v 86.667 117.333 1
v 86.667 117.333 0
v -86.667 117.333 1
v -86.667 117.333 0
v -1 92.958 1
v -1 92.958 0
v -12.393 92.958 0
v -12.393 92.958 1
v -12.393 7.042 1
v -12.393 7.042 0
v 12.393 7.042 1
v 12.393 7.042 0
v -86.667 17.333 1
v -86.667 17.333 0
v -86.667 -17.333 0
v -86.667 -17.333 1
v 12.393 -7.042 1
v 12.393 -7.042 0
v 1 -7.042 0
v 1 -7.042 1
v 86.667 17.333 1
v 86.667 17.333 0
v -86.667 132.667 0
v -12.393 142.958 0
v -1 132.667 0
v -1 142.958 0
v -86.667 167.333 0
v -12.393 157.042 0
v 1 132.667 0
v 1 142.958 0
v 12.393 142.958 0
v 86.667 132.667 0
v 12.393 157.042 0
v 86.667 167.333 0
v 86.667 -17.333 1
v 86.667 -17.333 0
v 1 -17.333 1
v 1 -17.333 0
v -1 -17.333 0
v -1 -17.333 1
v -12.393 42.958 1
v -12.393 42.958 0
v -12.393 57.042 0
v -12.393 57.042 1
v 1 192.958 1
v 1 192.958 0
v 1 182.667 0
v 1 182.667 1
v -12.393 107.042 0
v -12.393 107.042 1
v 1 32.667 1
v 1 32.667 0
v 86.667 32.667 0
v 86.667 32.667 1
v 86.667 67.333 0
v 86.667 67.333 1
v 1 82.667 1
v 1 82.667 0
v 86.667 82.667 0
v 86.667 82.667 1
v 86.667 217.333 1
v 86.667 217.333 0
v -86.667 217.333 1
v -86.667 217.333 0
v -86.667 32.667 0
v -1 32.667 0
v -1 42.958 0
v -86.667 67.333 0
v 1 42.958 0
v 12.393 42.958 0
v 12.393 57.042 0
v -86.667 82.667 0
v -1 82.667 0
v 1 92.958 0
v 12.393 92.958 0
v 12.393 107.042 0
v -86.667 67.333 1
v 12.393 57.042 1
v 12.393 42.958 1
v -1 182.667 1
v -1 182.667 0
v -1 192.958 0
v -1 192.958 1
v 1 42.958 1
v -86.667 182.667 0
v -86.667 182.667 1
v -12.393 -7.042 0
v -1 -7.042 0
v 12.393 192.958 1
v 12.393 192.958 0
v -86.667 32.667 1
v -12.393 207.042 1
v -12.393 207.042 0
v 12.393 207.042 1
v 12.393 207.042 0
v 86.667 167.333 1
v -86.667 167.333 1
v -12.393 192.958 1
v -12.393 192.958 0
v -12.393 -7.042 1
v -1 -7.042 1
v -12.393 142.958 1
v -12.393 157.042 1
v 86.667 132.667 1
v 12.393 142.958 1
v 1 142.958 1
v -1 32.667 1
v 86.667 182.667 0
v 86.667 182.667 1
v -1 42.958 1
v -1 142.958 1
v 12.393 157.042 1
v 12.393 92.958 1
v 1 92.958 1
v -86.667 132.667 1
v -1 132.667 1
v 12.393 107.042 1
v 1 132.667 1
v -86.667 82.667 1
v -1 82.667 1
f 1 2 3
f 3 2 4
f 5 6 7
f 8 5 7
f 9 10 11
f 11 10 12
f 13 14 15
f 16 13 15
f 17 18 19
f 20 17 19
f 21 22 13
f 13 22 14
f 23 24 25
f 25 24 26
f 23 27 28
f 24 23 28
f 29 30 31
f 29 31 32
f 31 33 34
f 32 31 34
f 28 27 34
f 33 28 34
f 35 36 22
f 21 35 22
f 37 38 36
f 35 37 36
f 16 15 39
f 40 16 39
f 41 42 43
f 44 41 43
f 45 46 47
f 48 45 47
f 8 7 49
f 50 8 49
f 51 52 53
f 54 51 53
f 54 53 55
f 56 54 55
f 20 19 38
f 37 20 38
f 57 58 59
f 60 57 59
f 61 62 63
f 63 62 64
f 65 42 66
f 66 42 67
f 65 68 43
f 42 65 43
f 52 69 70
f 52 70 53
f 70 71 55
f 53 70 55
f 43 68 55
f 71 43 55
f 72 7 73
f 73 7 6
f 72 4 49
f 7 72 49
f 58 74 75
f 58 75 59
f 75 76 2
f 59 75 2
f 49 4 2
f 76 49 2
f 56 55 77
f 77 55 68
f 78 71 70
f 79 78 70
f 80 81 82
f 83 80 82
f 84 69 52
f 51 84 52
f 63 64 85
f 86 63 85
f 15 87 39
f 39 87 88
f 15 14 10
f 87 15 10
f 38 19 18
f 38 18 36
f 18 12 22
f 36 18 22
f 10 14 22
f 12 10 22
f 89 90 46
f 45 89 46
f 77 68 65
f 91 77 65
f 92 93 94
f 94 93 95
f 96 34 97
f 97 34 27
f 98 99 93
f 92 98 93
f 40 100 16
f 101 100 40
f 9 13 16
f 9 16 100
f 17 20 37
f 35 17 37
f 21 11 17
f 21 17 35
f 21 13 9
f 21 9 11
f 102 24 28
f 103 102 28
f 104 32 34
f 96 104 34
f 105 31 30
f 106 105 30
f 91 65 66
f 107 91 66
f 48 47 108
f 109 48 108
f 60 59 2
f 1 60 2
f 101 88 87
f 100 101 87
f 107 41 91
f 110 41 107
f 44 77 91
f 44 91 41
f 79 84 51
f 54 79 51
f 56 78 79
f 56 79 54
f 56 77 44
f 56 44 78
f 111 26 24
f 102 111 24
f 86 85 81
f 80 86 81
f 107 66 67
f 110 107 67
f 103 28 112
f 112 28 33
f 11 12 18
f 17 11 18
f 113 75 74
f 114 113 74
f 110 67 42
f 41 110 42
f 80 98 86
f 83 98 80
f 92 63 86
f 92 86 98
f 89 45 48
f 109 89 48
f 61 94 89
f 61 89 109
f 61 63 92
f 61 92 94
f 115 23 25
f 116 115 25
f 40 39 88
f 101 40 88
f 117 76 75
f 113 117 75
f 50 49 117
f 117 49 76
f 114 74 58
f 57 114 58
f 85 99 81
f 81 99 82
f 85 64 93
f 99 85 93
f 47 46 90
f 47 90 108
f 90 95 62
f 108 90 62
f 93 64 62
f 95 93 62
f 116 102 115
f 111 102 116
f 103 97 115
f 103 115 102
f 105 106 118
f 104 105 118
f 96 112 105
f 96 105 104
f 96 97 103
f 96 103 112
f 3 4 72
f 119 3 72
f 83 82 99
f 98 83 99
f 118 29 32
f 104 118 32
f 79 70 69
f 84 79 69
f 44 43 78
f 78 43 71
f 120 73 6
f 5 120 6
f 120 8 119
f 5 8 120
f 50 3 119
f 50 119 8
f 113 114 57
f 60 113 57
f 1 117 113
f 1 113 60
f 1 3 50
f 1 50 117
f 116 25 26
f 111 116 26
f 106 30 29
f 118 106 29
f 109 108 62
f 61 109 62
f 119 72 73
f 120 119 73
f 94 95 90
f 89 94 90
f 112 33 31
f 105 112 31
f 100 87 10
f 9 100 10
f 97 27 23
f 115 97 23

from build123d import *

# Parameters (mm, degrees)
F1_DEPTH = 1


with BuildPart() as f1:
    # F0 (on Top) → F1 (new body)
    with BuildSketch(Plane.XY):
        Polygon((86.666667, 17.333333), (0, 17.333333), (-86.666667, 17.333333), (-86.666667, 0), (-86.666667, -17.333333), (-1, -17.333333), (-1, -7.041667), (-12.393333, -7.041667), (-12.393333, 0), (-12.393333, 7.041667), (0, 7.041667), (12.393333, 7.041667), (12.393333, 0), (12.393333, -7.041667), (1, -7.041667), (1, -17.333333), (86.666667, -17.333333), (86.666667, 0), align=None)
        Polygon((86.666667, 50), (86.666667, 67.333333), (0, 67.333333), (-86.666667, 67.333333), (-86.666667, 50), (-86.666667, 32.666667), (-1, 32.666667), (-1, 42.958333), (-12.393333, 42.958333), (-12.393333, 50), (-12.393333, 57.041667), (0, 57.041667), (12.393333, 57.041667), (12.393333, 50), (12.393333, 42.958333), (1, 42.958333), (1, 32.666667), (86.666667, 32.666667), align=None)
        Polygon((86.666667, 100), (86.666667, 117.333333), (0, 117.333333), (-86.666667, 117.333333), (-86.666667, 100), (-86.666667, 82.666667), (-1, 82.666667), (-1, 92.958333), (-12.393333, 92.958333), (-12.393333, 100), (-12.393333, 107.041667), (0, 107.041667), (12.393333, 107.041667), (12.393333, 100), (12.393333, 92.958333), (1, 92.958333), (1, 82.666667), (86.666667, 82.666667), align=None)
        Polygon((86.666667, 150), (86.666667, 167.333333), (0, 167.333333), (-86.666667, 167.333333), (-86.666667, 150), (-86.666667, 132.666667), (-1, 132.666667), (-1, 142.958333), (-12.393333, 142.958333), (-12.393333, 150), (-12.393333, 157.041667), (0, 157.041667), (12.393333, 157.041667), (12.393333, 150), (12.393333, 142.958333), (1, 142.958333), (1, 132.666667), (86.666667, 132.666667), align=None)
        Polygon((86.666667, 200), (86.666667, 217.333333), (0, 217.333333), (-86.666667, 217.333333), (-86.666667, 200), (-86.666667, 182.666667), (-1, 182.666667), (-1, 192.958333), (-12.393333, 192.958333), (-12.393333, 200), (-12.393333, 207.041667), (0, 207.041667), (12.393333, 207.041667), (12.393333, 200), (12.393333, 192.958333), (1, 192.958333), (1, 182.666667), (86.666667, 182.666667), align=None)
    extrude(amount=F1_DEPTH)


solid = f1.part
